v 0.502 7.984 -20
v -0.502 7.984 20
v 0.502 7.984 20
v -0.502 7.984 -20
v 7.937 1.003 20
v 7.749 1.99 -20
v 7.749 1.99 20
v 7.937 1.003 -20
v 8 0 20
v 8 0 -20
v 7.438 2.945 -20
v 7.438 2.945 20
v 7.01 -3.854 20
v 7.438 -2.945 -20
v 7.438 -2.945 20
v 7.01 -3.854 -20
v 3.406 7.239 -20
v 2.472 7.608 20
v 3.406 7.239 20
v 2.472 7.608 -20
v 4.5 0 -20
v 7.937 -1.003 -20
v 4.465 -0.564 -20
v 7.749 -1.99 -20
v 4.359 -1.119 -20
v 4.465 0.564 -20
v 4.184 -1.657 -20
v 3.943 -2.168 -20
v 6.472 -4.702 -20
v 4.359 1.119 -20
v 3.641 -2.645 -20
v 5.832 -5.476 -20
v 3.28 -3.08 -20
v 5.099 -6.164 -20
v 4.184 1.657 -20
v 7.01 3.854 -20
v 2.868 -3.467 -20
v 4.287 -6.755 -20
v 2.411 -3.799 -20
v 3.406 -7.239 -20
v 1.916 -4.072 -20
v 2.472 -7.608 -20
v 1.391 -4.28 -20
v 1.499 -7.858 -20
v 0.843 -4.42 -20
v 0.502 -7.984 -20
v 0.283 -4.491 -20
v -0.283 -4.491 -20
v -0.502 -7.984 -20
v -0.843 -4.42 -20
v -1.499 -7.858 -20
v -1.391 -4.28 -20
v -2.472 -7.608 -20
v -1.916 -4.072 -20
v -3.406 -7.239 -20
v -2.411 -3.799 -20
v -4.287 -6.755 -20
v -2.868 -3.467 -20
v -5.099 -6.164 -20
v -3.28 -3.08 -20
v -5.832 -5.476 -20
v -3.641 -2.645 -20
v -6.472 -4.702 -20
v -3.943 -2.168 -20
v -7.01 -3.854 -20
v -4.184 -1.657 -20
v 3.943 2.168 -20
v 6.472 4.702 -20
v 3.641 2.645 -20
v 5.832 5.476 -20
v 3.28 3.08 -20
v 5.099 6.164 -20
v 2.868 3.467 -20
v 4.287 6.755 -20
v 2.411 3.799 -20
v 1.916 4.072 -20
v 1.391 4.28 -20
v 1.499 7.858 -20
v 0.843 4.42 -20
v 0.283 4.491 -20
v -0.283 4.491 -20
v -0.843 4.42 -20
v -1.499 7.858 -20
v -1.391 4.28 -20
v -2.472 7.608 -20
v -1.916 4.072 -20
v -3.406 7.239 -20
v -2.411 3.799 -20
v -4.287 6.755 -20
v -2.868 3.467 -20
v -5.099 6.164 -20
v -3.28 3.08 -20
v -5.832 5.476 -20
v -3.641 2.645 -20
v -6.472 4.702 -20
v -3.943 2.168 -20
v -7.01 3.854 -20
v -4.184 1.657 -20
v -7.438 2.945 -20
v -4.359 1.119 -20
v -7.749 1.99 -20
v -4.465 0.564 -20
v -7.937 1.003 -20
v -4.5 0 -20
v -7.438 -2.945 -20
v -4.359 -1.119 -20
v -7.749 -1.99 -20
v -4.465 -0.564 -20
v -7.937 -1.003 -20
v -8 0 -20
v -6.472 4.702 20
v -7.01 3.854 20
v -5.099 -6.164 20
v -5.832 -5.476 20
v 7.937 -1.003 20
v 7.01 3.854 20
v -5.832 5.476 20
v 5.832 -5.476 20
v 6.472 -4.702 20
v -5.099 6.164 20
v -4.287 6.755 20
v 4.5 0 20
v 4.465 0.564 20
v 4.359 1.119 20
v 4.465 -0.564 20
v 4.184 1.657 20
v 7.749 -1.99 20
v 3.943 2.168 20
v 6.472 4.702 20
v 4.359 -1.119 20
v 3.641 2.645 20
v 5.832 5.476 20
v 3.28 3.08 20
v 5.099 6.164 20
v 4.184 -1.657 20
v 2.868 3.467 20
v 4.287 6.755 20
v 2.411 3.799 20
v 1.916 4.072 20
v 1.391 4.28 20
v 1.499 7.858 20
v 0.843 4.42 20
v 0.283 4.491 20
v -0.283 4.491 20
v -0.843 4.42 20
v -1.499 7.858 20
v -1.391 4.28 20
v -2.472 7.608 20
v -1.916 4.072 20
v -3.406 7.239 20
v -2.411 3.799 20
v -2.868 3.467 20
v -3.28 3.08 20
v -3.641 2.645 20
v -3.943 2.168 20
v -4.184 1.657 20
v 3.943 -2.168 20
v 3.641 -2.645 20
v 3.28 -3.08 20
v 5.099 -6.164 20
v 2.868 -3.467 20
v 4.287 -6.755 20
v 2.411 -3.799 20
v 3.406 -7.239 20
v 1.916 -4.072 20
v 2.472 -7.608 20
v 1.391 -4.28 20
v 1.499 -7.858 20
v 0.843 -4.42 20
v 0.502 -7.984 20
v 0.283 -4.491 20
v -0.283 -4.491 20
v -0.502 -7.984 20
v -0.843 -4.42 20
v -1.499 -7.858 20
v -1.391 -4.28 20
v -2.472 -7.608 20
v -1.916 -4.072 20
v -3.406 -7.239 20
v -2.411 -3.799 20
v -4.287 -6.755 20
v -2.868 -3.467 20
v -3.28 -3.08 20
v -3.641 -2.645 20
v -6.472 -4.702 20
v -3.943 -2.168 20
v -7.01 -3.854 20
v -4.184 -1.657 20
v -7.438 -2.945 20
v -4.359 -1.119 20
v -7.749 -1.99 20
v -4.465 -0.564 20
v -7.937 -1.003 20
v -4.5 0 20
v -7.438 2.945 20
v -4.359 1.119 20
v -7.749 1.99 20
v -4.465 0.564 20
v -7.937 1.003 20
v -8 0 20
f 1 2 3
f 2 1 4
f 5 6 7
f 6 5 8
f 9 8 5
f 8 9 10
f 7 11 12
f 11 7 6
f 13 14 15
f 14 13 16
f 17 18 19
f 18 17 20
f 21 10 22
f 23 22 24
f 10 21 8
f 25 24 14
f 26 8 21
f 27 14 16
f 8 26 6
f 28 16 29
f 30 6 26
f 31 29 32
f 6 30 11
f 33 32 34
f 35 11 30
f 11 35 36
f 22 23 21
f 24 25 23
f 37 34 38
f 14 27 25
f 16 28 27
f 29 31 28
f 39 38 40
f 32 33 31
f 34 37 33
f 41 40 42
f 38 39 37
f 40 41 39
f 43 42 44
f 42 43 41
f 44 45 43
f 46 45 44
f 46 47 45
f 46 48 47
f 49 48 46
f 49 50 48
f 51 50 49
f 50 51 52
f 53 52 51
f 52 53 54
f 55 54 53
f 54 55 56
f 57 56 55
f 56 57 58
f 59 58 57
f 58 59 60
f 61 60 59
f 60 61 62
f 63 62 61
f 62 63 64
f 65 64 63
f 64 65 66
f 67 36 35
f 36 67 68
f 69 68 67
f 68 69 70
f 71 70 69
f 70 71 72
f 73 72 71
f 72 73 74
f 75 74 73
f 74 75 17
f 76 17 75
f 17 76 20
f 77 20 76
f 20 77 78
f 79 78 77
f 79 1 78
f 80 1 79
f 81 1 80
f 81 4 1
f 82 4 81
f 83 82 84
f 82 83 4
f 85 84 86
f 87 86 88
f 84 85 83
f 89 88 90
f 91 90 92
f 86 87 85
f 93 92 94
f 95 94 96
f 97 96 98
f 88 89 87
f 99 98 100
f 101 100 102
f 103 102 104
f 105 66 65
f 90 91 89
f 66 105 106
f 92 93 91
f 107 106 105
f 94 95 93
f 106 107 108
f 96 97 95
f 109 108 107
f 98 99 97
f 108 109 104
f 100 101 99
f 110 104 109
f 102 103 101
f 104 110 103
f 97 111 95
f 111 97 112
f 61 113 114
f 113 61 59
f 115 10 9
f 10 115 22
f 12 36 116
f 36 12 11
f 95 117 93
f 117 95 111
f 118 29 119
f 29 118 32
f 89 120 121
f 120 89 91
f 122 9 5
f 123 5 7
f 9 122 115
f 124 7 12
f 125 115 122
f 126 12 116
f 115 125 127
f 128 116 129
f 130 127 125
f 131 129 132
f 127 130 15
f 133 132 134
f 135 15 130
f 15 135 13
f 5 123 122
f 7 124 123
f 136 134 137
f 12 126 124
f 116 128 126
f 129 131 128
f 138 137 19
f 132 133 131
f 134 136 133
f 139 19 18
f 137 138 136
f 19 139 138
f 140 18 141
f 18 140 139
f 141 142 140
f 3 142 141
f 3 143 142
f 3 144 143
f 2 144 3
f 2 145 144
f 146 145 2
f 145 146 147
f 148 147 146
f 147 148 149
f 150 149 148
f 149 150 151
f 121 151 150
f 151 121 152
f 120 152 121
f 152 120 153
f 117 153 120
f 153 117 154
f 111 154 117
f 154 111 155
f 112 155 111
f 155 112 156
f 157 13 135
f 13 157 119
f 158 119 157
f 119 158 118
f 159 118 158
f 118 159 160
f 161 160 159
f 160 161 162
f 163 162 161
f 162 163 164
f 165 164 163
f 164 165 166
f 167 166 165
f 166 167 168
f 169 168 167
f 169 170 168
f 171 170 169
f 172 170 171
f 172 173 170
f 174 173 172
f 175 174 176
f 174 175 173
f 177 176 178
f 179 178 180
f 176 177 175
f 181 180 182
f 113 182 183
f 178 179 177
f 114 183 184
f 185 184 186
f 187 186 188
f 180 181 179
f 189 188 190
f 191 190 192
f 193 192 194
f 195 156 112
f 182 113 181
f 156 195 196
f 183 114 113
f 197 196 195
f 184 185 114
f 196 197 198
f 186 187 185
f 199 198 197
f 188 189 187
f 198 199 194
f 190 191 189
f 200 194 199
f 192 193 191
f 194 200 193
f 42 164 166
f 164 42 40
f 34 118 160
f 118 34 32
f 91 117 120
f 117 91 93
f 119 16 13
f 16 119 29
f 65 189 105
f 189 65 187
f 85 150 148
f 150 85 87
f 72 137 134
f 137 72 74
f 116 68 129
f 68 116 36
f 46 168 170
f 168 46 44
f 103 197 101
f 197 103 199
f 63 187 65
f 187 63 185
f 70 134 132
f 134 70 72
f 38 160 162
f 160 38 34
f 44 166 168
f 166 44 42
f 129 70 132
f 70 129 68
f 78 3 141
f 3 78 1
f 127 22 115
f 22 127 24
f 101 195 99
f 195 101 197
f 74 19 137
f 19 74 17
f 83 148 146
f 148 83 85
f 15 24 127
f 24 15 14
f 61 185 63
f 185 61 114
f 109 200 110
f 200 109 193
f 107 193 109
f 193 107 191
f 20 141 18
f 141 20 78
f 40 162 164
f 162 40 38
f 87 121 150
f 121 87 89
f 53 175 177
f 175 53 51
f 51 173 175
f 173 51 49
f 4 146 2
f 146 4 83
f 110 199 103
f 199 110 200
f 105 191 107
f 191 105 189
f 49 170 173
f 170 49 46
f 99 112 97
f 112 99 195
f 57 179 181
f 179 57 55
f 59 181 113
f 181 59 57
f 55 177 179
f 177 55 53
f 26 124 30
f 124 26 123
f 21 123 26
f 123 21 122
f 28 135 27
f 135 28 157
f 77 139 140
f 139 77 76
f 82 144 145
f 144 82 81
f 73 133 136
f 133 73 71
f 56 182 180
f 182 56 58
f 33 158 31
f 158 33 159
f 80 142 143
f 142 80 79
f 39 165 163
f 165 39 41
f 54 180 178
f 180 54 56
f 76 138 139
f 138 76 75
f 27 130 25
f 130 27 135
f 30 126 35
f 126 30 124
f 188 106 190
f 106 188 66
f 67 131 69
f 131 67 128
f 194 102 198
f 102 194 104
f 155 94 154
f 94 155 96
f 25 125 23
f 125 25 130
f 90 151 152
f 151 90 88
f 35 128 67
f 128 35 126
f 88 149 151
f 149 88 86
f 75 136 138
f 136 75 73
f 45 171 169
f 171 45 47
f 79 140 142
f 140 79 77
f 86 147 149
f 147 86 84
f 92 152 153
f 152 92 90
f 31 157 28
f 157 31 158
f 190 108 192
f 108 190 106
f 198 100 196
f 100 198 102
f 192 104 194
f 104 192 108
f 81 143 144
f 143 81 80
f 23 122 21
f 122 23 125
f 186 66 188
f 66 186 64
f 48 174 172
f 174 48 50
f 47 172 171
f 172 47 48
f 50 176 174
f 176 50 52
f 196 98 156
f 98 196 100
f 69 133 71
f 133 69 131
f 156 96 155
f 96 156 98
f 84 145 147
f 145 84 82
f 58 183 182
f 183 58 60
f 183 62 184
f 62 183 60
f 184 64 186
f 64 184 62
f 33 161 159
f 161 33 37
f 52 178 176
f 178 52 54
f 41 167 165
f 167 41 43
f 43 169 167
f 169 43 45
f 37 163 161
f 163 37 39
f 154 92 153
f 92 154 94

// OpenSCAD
$fn = 50;


difference() {
	union() {
		translate(v = [0, 0, -20.0000000000]) {
			cylinder(h = 40, r = 8.0000000000);
		}
	}
	union() {
		translate(v = [0, 0, -100.0000000000]) {
			cylinder(h = 200, r = 4.5000000000);
		}
	}
}
